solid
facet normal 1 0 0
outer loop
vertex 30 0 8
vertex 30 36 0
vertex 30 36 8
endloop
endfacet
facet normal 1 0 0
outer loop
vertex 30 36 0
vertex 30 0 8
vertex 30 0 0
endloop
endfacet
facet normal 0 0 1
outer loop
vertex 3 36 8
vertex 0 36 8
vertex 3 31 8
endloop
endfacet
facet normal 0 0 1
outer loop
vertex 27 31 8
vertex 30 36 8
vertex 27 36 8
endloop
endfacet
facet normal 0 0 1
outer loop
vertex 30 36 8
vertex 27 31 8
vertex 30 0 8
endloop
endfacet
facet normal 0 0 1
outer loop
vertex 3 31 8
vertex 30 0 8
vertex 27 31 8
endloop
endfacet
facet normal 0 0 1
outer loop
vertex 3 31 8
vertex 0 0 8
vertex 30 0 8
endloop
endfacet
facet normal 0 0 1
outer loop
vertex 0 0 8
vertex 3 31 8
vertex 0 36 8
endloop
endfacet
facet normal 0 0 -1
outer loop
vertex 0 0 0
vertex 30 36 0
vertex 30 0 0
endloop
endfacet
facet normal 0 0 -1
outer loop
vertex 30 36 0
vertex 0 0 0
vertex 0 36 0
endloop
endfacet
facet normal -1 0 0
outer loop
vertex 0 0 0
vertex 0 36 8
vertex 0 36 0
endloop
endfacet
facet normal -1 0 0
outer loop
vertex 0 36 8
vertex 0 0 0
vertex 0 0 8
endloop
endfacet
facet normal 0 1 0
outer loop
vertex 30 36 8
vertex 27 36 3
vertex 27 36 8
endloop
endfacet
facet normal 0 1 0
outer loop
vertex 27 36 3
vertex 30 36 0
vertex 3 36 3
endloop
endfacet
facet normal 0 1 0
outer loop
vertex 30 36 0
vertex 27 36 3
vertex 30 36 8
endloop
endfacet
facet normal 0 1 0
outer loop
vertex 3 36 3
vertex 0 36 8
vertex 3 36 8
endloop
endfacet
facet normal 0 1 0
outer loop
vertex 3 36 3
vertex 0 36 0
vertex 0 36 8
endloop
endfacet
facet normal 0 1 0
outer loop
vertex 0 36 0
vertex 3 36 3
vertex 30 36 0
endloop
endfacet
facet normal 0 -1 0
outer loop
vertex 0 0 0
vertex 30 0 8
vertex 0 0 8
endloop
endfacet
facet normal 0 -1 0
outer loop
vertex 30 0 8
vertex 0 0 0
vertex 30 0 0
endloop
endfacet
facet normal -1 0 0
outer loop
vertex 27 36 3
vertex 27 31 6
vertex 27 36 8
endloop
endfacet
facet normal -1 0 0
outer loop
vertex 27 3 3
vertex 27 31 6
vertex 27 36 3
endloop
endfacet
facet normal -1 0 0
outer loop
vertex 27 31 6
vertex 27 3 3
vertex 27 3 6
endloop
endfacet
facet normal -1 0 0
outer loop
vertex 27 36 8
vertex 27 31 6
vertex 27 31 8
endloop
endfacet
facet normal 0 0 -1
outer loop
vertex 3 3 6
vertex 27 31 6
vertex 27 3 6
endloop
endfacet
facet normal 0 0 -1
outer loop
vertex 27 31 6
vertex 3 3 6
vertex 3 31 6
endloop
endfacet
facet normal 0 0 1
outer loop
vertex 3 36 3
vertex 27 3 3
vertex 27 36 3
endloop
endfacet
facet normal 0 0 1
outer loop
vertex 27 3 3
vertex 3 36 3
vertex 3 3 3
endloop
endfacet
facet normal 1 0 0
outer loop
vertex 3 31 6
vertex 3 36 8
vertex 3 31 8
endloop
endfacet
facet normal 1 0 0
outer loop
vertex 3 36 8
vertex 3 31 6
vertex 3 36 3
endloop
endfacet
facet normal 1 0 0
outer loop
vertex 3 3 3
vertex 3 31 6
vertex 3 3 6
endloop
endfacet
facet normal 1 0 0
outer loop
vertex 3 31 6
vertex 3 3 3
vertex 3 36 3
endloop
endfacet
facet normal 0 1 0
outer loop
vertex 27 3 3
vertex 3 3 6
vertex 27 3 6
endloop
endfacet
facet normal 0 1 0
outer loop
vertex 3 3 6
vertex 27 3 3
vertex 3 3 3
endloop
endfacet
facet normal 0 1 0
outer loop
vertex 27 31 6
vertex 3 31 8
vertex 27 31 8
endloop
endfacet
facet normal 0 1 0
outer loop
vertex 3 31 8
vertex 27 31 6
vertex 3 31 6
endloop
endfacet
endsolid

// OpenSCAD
difference()
{
	translate([0,0,0]) cube([30,36,8]);
	translate([3,3,3]) cube([24,35,3]);
	translate([3,31,3]) cube([24,7,6]);
}
